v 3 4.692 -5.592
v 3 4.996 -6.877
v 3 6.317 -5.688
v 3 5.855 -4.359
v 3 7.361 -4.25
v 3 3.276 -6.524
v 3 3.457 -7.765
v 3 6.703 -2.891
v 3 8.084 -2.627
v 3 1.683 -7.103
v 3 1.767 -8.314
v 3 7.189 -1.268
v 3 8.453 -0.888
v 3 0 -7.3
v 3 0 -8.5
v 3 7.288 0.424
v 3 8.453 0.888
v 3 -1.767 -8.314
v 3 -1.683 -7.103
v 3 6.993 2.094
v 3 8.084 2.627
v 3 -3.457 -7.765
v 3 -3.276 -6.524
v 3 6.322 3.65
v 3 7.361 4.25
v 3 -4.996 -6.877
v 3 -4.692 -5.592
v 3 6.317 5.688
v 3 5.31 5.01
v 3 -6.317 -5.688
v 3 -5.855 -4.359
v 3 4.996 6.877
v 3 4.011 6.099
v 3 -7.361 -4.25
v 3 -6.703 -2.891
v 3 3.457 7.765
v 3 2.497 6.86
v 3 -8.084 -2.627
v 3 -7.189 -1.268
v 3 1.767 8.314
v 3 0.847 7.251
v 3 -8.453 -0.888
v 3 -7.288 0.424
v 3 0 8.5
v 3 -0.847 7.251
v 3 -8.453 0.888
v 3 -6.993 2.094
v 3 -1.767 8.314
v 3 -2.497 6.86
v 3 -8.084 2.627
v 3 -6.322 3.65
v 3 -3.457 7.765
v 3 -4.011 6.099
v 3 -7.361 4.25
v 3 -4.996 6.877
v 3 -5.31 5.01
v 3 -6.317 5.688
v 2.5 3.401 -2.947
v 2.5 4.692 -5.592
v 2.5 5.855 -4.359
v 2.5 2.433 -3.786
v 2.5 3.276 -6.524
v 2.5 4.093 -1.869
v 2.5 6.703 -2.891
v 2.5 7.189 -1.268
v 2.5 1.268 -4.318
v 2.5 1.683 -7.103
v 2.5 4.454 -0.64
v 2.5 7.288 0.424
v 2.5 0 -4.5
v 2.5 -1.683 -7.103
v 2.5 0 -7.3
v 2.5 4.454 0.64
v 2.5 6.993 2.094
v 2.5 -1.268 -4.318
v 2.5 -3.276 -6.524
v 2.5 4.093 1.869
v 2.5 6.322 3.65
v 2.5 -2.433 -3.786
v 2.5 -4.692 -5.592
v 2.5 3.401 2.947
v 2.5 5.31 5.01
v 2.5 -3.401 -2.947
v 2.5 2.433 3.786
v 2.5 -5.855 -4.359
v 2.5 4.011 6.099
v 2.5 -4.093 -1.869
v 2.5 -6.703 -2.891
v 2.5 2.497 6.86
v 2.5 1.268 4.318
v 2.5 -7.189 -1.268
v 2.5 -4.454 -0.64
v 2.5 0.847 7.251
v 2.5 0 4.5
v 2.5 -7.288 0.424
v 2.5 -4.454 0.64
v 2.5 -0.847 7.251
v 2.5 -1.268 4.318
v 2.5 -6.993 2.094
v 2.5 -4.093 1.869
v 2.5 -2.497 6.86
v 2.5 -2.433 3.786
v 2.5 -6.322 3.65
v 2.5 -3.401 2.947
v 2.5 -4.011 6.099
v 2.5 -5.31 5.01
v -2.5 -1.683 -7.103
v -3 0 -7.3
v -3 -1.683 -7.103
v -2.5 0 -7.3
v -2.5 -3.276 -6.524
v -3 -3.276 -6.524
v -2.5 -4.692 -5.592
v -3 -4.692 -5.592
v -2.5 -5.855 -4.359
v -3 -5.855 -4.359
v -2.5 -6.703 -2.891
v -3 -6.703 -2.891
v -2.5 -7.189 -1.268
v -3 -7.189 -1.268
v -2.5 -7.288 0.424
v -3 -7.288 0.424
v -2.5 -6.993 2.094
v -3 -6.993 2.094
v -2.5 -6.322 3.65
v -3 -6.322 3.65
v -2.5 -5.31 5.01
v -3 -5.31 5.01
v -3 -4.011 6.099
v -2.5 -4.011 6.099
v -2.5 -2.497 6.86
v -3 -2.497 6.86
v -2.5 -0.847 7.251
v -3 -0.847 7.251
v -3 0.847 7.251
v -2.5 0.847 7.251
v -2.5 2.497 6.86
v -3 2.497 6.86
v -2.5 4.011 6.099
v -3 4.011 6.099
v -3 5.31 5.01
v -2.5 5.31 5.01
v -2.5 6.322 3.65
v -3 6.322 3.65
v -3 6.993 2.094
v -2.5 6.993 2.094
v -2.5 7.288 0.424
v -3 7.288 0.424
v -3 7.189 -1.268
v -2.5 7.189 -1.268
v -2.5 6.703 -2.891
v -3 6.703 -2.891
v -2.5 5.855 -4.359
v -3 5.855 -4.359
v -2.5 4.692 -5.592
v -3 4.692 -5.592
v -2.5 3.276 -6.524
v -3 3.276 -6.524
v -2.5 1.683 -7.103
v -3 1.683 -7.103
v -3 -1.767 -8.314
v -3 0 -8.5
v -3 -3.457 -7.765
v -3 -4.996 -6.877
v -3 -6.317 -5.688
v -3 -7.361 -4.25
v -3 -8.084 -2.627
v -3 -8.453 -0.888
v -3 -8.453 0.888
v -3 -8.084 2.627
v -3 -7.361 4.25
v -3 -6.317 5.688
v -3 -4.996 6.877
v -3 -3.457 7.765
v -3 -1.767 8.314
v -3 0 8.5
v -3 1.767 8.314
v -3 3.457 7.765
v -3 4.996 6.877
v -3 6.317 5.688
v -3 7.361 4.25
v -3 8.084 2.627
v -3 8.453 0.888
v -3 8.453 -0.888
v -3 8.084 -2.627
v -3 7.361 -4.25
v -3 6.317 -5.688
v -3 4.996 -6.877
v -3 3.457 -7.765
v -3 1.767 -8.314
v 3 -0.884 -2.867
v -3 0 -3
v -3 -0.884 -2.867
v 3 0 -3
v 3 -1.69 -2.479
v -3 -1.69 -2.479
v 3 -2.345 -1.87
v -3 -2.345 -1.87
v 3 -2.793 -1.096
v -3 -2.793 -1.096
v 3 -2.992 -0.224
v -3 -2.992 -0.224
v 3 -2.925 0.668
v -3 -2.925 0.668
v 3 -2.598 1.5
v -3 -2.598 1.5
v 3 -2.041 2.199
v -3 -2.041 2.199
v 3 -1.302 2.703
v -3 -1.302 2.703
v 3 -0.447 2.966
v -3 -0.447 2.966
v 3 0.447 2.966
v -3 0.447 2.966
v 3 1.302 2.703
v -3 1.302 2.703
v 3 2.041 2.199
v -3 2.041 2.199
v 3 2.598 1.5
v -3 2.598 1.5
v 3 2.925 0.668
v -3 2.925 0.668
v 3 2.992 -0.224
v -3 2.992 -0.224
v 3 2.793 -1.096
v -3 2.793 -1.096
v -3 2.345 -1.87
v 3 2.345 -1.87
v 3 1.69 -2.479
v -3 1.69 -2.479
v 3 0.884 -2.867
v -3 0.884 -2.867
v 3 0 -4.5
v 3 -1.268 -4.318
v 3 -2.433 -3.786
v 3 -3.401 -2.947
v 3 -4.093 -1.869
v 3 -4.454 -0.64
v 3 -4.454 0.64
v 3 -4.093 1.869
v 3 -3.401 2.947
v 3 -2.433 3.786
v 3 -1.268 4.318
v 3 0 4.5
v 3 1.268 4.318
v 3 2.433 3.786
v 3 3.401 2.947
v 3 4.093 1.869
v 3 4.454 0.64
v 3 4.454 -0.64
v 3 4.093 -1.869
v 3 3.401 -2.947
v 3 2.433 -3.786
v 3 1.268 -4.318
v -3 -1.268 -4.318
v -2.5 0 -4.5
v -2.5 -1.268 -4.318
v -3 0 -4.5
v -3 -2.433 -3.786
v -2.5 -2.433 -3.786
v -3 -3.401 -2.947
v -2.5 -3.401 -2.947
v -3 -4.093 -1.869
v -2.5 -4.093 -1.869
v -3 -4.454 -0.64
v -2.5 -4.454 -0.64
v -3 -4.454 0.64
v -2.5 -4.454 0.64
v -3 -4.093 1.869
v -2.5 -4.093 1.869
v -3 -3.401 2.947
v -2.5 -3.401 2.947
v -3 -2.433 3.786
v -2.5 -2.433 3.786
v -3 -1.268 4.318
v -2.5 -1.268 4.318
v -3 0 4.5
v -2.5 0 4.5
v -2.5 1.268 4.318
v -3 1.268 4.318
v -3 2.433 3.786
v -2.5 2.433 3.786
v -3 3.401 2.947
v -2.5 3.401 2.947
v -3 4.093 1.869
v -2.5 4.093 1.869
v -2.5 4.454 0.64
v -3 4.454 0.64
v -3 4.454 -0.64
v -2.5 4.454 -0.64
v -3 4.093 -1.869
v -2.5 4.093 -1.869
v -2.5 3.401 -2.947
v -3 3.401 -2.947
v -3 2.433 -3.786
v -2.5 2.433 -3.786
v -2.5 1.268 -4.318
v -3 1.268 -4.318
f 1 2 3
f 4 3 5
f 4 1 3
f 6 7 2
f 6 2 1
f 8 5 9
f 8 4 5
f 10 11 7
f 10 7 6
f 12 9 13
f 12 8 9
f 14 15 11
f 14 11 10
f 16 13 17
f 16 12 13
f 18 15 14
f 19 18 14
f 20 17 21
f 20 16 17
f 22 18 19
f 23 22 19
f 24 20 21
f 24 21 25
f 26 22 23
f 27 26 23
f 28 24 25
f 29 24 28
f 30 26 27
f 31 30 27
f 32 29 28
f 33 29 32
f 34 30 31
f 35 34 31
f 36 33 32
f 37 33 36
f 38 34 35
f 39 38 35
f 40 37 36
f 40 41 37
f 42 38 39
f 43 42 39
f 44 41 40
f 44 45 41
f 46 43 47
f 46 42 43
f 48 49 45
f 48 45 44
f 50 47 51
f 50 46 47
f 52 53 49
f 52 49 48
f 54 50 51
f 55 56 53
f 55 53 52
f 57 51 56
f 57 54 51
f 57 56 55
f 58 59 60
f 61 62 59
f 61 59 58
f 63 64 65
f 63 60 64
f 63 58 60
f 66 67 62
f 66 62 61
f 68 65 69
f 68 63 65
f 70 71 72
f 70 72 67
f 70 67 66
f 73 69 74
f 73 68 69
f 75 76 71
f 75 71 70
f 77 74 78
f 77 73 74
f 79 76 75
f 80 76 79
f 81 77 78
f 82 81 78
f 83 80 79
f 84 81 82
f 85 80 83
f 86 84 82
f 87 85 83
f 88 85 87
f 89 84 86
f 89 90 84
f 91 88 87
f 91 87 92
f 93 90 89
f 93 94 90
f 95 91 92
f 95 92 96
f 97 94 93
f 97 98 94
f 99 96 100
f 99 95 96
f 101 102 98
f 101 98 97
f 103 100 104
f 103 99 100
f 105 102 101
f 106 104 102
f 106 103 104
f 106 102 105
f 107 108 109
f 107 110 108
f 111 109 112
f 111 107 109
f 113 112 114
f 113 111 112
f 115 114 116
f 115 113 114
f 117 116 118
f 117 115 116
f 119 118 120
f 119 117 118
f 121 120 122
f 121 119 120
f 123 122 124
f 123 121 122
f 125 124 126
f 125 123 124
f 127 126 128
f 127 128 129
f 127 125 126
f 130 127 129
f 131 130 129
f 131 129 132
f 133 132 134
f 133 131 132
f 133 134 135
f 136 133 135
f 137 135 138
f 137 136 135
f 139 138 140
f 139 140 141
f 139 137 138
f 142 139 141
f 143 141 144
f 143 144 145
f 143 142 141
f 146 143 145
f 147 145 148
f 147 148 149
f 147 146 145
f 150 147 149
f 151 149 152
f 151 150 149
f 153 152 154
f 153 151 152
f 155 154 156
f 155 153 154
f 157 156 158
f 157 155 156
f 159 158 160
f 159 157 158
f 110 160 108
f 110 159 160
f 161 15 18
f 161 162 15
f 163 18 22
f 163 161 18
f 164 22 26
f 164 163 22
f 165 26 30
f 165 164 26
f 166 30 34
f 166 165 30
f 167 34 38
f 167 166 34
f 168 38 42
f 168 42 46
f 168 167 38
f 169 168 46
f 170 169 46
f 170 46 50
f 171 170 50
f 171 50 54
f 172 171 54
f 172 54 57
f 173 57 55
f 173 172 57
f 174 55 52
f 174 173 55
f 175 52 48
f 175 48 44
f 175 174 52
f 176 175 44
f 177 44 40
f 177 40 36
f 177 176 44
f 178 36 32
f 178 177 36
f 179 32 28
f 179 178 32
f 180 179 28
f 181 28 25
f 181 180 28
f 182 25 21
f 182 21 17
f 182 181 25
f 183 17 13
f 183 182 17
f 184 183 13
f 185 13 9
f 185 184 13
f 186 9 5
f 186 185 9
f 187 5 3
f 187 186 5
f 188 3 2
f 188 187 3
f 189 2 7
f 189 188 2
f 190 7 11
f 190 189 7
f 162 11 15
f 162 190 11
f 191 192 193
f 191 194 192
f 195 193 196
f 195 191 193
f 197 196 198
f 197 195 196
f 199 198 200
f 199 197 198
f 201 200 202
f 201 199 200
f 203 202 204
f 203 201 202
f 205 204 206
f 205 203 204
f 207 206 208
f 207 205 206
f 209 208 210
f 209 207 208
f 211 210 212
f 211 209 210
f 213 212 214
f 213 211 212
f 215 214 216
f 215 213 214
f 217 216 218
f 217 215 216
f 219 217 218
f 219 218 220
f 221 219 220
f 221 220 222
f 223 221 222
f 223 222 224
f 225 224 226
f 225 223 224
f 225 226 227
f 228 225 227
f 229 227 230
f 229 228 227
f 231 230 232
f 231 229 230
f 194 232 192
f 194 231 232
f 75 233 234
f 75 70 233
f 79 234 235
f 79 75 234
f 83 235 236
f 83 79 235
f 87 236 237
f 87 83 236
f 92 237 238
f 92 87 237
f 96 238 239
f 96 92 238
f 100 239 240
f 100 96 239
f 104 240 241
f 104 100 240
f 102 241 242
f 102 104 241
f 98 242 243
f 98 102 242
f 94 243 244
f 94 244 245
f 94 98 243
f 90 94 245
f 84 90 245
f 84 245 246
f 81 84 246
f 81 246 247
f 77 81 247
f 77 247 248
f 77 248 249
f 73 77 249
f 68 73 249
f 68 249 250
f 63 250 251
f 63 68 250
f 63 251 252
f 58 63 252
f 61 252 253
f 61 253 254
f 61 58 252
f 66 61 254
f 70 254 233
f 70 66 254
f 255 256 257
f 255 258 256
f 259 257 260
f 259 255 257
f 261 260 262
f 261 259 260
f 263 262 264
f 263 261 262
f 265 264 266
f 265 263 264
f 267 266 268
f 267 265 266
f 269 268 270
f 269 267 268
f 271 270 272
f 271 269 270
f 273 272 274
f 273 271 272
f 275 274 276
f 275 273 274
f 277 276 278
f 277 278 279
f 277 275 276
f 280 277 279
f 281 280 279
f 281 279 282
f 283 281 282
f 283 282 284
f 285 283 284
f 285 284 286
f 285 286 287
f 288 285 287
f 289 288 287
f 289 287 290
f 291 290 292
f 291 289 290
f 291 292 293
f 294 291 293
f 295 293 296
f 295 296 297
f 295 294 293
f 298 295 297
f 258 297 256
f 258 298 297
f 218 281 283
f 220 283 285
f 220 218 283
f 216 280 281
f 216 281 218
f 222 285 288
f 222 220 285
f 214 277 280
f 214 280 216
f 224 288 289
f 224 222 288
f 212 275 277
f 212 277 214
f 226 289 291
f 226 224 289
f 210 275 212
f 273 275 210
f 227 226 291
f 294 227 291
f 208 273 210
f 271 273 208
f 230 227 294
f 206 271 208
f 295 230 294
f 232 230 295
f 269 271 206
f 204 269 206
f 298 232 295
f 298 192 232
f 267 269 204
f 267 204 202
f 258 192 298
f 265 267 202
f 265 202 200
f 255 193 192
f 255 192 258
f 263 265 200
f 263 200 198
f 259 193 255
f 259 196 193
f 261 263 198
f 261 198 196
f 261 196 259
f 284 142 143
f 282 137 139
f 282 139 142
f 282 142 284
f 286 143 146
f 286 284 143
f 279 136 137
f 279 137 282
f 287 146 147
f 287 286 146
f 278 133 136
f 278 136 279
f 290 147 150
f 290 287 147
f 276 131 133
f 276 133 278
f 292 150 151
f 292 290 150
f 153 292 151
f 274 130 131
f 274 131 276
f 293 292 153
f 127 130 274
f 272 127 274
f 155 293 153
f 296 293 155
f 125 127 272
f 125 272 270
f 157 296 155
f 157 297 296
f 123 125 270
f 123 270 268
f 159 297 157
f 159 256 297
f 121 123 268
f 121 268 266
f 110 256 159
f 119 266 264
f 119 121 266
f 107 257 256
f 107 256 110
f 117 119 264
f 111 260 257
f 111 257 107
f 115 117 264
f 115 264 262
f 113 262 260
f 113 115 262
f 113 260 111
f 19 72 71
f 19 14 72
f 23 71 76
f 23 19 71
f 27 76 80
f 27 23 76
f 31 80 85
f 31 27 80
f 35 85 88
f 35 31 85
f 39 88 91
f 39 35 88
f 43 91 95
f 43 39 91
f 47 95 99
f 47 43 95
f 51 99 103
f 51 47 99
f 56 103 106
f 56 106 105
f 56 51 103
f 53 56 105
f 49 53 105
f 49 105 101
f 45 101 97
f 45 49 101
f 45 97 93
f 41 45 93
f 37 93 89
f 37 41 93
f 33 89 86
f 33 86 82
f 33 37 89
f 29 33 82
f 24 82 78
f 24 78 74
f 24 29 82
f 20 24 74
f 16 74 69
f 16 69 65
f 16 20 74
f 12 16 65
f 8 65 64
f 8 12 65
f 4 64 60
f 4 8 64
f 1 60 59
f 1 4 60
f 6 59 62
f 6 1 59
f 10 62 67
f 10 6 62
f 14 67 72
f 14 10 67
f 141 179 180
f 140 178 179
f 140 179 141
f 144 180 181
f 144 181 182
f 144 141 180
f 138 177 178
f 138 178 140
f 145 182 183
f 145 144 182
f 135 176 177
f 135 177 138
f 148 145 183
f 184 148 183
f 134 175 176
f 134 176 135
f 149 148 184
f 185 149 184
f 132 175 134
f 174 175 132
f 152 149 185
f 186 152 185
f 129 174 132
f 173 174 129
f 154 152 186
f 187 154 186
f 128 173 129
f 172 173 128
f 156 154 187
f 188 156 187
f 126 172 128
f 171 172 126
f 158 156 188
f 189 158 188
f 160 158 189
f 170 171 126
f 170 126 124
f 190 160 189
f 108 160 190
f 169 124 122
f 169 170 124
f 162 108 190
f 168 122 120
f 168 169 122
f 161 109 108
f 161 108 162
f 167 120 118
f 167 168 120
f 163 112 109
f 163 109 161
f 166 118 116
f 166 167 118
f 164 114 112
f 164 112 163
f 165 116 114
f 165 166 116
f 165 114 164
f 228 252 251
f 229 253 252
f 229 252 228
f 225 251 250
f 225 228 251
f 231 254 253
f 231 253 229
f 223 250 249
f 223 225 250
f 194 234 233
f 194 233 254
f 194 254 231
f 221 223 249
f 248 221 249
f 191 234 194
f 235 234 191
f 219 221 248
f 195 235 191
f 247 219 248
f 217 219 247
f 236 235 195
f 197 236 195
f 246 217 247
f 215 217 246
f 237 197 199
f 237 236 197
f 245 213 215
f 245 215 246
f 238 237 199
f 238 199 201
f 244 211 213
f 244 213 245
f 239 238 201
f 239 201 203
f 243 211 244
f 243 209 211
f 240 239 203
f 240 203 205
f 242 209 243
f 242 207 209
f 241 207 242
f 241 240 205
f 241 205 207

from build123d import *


with BuildPart() as part:
    # Croquis2 → Revolución1 (revolve)
    with BuildSketch(Plane.XY, mode=Mode.PRIVATE) as revoluci_n1_sk:
        Polygon((3, 7.3), (3, 8.5), (0, 8.5), (0, 3), (3, 3), (3, 4.5), (2.5, 4.5), (2.5, 7.3), align=None)
        Polygon((0, 3), (0, 8.5), (-3, 8.5), (-3, 7.3), (-2.5, 7.3), (-2.5, 4.5), (-3, 4.5), (-3, 3), align=None)
    revolve(revoluci_n1_sk.sketch.rotate(Axis((6.771887169, 0, 0), (-1, 0, 0)), 90), axis=Axis((6.771887169, 0, 0), (-1, 0, 0)))


solid = part.part
